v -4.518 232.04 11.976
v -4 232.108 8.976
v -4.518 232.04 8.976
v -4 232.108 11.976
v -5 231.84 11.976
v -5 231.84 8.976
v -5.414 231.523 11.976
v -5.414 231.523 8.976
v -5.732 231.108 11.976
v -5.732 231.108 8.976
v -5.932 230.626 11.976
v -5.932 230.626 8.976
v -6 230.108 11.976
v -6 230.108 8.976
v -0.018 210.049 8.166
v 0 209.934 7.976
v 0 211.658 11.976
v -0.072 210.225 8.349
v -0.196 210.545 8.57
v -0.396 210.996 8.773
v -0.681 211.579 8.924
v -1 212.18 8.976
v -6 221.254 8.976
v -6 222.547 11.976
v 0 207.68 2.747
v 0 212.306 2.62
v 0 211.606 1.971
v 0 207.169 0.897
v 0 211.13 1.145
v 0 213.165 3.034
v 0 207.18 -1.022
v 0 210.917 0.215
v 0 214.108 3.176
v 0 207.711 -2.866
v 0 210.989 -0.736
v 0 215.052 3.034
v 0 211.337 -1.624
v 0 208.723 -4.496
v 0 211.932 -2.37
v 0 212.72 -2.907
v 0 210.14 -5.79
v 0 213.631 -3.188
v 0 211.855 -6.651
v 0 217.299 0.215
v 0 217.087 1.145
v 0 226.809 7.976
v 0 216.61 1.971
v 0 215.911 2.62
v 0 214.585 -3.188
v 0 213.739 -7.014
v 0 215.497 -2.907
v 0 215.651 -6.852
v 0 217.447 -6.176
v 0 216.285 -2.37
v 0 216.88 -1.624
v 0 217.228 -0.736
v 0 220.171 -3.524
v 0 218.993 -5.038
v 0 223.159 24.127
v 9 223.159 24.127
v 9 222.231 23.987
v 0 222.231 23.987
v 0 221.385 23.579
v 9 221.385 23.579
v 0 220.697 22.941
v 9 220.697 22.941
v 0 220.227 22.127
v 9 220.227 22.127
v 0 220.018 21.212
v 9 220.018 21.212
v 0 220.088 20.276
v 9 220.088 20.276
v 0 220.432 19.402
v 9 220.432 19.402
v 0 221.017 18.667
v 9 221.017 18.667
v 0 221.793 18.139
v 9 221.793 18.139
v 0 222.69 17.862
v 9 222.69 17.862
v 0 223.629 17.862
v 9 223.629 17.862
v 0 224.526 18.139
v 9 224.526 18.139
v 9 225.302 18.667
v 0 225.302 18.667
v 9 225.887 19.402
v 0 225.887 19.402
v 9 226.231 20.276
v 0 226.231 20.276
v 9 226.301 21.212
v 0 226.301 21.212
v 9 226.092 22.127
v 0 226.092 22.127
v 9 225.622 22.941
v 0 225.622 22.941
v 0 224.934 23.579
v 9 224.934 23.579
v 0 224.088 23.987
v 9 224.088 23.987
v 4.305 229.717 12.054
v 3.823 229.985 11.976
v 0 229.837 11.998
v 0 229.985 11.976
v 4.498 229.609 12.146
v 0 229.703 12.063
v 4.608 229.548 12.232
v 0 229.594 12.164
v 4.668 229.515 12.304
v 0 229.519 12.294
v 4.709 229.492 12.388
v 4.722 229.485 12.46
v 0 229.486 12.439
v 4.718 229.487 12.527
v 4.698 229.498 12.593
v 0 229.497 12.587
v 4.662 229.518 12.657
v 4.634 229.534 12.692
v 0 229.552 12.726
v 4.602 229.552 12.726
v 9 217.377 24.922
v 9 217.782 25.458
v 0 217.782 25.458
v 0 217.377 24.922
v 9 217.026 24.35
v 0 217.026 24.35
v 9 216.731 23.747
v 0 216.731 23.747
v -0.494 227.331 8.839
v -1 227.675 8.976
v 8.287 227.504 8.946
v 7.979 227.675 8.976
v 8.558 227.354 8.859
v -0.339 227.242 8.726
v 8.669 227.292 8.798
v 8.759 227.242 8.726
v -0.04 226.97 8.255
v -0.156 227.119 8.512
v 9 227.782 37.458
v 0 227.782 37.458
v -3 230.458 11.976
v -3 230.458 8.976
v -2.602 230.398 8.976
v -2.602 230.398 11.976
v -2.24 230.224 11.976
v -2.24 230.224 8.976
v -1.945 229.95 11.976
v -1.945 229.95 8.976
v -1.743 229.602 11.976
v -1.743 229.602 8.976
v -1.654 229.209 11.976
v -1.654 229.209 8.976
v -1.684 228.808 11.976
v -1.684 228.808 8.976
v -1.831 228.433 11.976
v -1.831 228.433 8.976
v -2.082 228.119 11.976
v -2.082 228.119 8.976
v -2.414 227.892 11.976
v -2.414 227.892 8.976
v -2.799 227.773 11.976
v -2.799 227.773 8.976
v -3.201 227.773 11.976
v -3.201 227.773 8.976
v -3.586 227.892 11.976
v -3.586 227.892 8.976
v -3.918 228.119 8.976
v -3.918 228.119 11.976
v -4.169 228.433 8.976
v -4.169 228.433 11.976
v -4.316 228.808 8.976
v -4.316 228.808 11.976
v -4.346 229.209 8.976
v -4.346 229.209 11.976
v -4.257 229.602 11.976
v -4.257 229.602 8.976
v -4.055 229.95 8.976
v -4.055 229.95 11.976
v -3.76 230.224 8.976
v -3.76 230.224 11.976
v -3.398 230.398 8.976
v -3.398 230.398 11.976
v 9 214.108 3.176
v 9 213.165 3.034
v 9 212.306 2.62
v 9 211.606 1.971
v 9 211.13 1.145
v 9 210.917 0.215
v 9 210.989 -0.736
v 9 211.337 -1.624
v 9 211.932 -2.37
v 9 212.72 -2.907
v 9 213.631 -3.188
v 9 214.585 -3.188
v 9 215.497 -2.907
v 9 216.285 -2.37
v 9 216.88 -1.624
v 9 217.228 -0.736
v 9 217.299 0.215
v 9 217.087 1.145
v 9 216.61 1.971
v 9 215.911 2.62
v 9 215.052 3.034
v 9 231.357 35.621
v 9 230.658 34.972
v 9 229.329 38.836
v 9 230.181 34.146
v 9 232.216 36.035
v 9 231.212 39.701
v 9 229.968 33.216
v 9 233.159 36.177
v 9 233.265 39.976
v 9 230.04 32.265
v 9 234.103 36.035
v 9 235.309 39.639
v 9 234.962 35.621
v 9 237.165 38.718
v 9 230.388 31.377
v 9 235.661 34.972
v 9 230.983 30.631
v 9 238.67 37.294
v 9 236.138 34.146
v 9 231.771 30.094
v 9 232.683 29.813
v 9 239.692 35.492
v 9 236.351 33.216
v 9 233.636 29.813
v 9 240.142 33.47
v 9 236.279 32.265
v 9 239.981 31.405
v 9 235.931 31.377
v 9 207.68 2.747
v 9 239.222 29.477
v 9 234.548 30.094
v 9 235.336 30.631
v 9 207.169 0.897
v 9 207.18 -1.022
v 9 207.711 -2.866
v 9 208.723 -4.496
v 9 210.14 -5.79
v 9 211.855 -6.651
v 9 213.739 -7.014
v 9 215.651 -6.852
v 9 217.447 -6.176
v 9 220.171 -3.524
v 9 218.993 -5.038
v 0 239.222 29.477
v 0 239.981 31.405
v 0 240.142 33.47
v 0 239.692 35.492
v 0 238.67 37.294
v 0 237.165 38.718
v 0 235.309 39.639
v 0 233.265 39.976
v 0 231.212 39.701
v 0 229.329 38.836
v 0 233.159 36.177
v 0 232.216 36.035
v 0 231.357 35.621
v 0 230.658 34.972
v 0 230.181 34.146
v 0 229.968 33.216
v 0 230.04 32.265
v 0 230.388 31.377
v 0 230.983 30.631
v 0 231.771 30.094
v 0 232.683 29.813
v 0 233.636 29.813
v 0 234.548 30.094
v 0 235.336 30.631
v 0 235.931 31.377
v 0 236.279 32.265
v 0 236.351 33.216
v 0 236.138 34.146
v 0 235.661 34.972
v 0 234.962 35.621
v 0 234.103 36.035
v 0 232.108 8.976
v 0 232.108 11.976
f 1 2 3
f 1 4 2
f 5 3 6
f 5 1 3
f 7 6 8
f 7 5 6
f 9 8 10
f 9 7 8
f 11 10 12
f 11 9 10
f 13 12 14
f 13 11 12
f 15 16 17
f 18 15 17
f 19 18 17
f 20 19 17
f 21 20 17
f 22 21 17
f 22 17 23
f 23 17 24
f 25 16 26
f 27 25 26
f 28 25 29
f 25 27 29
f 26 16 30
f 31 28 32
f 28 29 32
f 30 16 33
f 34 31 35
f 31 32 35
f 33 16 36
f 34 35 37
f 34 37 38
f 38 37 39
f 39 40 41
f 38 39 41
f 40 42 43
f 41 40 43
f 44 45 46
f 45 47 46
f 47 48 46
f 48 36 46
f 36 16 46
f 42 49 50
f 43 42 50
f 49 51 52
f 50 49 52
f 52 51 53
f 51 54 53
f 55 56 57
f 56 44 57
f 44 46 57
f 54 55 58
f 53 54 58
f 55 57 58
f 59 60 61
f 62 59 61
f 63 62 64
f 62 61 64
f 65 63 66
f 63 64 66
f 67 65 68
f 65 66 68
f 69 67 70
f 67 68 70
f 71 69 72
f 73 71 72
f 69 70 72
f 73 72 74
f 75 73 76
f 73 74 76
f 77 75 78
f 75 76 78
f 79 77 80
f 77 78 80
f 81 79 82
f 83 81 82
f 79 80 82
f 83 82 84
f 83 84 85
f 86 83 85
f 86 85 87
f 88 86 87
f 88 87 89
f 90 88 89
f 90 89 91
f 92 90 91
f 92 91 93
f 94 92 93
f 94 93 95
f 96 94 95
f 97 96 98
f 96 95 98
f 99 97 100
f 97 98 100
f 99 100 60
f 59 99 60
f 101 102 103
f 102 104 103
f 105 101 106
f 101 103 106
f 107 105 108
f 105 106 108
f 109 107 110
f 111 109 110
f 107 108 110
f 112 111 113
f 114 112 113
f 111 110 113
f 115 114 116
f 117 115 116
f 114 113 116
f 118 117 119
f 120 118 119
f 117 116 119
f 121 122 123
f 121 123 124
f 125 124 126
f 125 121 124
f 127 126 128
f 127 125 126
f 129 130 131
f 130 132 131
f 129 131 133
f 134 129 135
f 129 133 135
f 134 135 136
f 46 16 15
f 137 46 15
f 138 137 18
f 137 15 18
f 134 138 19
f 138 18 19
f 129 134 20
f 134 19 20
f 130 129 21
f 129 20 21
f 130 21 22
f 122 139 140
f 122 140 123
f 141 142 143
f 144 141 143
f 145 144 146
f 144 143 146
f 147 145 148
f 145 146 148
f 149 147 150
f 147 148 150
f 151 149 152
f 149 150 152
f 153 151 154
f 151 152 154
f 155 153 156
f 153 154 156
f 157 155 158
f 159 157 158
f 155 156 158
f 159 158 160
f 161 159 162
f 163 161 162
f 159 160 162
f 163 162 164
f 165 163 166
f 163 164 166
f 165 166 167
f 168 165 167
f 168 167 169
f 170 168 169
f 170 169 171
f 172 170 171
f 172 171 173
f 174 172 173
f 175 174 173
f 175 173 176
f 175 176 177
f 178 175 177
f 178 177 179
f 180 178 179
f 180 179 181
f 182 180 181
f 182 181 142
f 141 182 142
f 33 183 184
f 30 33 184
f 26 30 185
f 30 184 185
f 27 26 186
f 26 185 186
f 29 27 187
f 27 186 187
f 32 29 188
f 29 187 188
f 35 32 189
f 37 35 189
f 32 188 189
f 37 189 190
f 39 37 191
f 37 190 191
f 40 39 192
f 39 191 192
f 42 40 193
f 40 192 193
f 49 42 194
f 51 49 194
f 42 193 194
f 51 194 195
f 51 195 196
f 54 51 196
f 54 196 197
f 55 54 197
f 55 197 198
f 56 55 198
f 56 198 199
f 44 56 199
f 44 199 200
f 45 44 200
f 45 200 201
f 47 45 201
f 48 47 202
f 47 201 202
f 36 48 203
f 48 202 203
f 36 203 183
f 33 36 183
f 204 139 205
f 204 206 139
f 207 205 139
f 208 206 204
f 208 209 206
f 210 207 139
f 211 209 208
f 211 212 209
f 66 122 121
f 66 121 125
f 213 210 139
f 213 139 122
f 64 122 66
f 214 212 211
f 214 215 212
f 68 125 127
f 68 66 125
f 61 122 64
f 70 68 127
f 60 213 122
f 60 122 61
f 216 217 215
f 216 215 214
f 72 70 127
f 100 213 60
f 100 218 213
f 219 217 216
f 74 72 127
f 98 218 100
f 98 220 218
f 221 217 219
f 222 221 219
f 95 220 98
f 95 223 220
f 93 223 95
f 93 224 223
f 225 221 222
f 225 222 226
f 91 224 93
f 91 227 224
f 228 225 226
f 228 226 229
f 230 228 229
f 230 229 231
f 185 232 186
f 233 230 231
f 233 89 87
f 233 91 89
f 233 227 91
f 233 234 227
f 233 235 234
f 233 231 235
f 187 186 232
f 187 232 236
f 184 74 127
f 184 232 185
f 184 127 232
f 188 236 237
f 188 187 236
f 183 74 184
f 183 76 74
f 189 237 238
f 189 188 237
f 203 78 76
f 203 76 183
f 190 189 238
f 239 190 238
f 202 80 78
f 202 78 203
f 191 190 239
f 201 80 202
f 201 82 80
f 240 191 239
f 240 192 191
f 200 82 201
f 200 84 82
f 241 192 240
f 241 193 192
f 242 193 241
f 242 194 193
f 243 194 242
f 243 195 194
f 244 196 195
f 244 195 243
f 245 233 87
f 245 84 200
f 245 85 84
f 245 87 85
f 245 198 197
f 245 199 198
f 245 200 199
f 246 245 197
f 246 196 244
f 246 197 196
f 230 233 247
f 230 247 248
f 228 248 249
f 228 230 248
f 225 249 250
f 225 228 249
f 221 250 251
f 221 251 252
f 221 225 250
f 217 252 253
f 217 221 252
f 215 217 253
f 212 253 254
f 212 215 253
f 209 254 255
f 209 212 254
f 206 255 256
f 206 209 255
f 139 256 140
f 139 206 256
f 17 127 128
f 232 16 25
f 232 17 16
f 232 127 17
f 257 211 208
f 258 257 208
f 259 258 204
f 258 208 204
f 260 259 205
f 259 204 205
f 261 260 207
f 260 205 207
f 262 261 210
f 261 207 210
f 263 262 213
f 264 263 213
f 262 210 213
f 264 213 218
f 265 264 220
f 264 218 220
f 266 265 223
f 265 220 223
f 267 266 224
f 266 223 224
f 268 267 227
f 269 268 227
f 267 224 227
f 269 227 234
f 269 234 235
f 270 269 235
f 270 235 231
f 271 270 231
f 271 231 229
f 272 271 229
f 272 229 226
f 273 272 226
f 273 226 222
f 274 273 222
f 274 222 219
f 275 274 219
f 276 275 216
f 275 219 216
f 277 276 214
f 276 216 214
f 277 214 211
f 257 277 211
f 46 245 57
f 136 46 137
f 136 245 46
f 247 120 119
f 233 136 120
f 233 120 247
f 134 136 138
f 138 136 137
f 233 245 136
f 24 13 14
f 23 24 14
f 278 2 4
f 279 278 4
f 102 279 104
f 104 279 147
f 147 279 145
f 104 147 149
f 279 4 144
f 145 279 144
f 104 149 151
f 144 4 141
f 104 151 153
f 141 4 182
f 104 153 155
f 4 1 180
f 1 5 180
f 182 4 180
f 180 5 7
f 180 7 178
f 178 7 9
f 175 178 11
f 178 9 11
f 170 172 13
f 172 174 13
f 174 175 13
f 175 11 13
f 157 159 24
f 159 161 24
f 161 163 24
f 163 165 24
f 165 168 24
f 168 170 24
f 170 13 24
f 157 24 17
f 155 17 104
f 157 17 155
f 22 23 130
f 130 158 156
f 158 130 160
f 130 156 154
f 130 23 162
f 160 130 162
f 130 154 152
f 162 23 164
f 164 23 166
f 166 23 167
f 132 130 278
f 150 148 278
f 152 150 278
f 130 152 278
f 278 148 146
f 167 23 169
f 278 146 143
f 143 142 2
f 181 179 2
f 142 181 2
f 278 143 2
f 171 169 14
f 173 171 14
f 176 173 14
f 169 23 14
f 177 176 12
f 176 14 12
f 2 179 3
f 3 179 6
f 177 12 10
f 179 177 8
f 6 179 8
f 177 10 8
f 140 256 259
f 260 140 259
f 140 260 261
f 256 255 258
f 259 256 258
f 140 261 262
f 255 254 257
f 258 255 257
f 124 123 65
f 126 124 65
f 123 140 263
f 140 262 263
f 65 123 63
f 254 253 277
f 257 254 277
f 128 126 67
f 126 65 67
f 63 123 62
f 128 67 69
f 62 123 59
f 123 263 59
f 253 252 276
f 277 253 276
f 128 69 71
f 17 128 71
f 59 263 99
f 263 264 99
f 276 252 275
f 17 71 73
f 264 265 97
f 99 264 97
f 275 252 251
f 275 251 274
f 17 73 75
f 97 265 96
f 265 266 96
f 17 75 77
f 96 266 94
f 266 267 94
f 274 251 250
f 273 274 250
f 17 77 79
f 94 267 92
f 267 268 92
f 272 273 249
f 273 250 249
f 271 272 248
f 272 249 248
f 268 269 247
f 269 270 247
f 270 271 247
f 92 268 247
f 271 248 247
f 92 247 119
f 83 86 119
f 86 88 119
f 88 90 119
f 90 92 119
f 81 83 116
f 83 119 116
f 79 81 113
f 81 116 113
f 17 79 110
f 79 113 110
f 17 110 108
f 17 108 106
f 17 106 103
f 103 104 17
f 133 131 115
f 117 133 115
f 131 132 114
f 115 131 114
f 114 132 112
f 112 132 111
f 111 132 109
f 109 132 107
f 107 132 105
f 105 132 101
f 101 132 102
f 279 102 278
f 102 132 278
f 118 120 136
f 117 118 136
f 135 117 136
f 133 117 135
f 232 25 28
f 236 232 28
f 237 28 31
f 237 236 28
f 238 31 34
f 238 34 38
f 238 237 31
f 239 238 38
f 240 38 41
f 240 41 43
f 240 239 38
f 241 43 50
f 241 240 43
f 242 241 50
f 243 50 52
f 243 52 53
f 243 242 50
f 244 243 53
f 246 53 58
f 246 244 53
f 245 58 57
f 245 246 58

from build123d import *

# Parameters (mm, degrees)
SKETCH1_R                       = 3.20000000000001
SKETCH1_R_2                     = 3.2000000000000157
SKETCH1_R_3                     = 3.1500000000000266
BOSS_EXTRUDE1_DEPTH             = 9.000000000000002
BOSS_EXTRUDE2_DEPTH             = 6
BOSS_EXTRUDE2_DIRECTION_2_REACH = 245.63
SKETCH3_R                       = 1.3499999999999934
CUT_EXTRUDE1_DEPTH              = 243.3192700509415
CHAMFER1_SIZE                   = 6
CHAMFER1_SIZE_2                 = 10
CHAMFER2_SIZE                   = 5
CHAMFER2_SIZE_2                 = 9
FILLET1_R                       = 2
FILLET2_R                       = 0.5
FILLET3_R                       = 0.5
FILLET4_R                       = 1


with BuildPart() as part:
    # Sketch1 → Boss-Extrude1 (new body)
    with BuildSketch(Plane(origin=(9.000000000000002, 0, 0), x_dir=(0, 0, -1), z_dir=(1, 0, 0))):
        with BuildLine():
            Line((3.5235214674406836, 220.17063085897752), (-29.477274377996263, 239.2218112310119))
            ThreePointArc((-29.477274377996263, 239.2218112310119), (-38.718007493319135, 237.16461837930046), (-37.45821987569468, 227.78186152983258))
            Line((-37.45821987569468, 227.78186152983258), (-25.4578021395881, 217.78186152983255))
            ThreePointArc((-25.4578021395881, 217.78186152983255), (-24.640376533153265, 217.19486094146168), (-23.74722639538112, 216.731139964795))
            Line((-23.74722639538112, 216.731139964795), (-2.7468482860507106, 207.6799595927607))
            ThreePointArc((-2.7468482860507106, 207.6799595927607), (6.279741658038257, 210.96778498862912), (3.5235214674406836, 220.17063085897752))
        make_face()
        with Locations(Location((0.02377470320349104, 214.10830683380283, 0), (0, 0, 180))):
            Circle(SKETCH1_R, mode=Mode.SUBTRACT)
        with Locations(Location((-32.97702114223346, 233.1594872058372, 0), (0, 0, 180))):
            Circle(SKETCH1_R_2, mode=Mode.SUBTRACT)
        with Locations(Location((-20.97660340612688, 223.1594872058372, 0), (0, 0, 180))):
            Circle(SKETCH1_R_3, mode=Mode.SUBTRACT)
    extrude(amount=-BOSS_EXTRUDE1_DEPTH)

    # Sketch2 → Boss-Extrude2 (add)
    with BuildSketch(Plane.ZY):
        Polygon((8.976225296796509, 232.10830683380286), (11.976225296796507, 232.10830683380286), (11.97622529679651, 211.6578287344907), (8.976225296796512, 210.36482624783363), align=None)
    extrude(amount=BOSS_EXTRUDE2_DEPTH)

    # Boss-Extrude2 direction 2: up to this face of the body (flat: up to its plane)
    boss_extrude2_direction_2_end = Plane(part.part.faces().sort_by_distance((9, 223.146004551, 16.682900482))[0])
    # Sketch2 → Boss-Extrude2 direction 2 (add, up to the picked face)
    with BuildSketch(Plane.ZY, mode=Mode.PRIVATE) as boss_extrude2_direction_2_sk1:
        Polygon((8.976225296796509, 232.10830683380286), (11.976225296796507, 232.10830683380286), (11.97622529679651, 211.6578287344907), (8.976225296796512, 210.36482624783363), align=None)
    boss_extrude2_direction_2_tool1 = split(extrude(boss_extrude2_direction_2_sk1.sketch, amount=-BOSS_EXTRUDE2_DIRECTION_2_REACH, mode=Mode.PRIVATE), bisect_by=boss_extrude2_direction_2_end, keep=Keep.BOTH, mode=Mode.PRIVATE)
    add(boss_extrude2_direction_2_tool1.solids().sort_by(Axis((0, 221.556515, 10.460903), (1, 0, 0)))[0])

    # Sketch3 → Cut-Extrude1 (cut, through all)
    with BuildSketch(Plane(origin=(0, 1.43e-15, 8.976225296796544), x_dir=(-1, 0, 0), z_dir=(0, -1.6e-16, -1))):
        with Locations(Location((3, 229.10830683380286, 0), (0, 0, 90))):
            Circle(SKETCH3_R)
    extrude(amount=-CUT_EXTRUDE1_DEPTH, mode=Mode.SUBTRACT)

    # Chamfer1
    # the kernel refuses this chamfer: 10, 6 mm, written as the material it takes off along each edge
    with BuildSketch(Plane(origin=(-6, 221.89433509463086, 35.72677442359438), x_dir=(0.9984760801092615, -0.05067944312803606, 0.021842881995648558), z_dir=(0, -0.3958032841791771, -0.9183353201488973))) as chamfer1_piece_1:
        Polygon((CHAMFER1_SIZE * 0.998476080109, -CHAMFER1_SIZE * 0.0551862070598), (-CHAMFER1_SIZE_2 * 0.0551862070598, -CHAMFER1_SIZE_2 * 0.998476080109), (0, 0), align=None)
    extrude(amount=54.99200253498646, mode=Mode.SUBTRACT)

    # Chamfer2
    # the kernel refuses this chamfer: 9, 5 mm, written as the material it takes off along each edge
    with BuildSketch(Plane(origin=(9.000000000000002, 232.10830683380286, -14.314617746831651), x_dir=(0.060700782983652134, -0.9981560073180803, 0), z_dir=(0, 0, 1))) as chamfer2_piece_1_section:
        Polygon((CHAMFER2_SIZE * 0.998156007318, -CHAMFER2_SIZE * 0.0607007829837), (-CHAMFER2_SIZE_2 * 0.0607007829837, -CHAMFER2_SIZE_2 * 0.998156007318), (0, 0), align=None)
    chamfer2_piece_1 = extrude(amount=49.581686087256315, mode=Mode.PRIVATE)
    chamfer2_piece_1 = split(chamfer2_piece_1, bisect_by=Plane(origin=(5.860742966777749, 228.82016054729928, 11.45934877100172), z_dir=(0, 0.8660462893106784, -0.49996382346246293)), keep=Keep.TOP, mode=Mode.PRIVATE)
    add(chamfer2_piece_1, mode=Mode.SUBTRACT)

    # Fillet1
    fillet1_edges = [part.edges().sort_by_distance(p)[0] for p in [
        (-6, 232.10830683380286, 10.476225296796507),
    ]]
    fillet(fillet1_edges, radius=FILLET1_R)

    # Fillet2
    fillet2_edges = [part.edges().sort_by_distance(p)[0] for p in [
        (4.249475994772133, 227.38666683961173, 8.97622529679651),
    ]]
    fillet(fillet2_edges, radius=FILLET2_R)

    # Fillet3
    fillet3_edges = [part.edges().sort_by_distance(p)[0] for p in [
        (2.6907806455631165, 229.11855056095553, 11.976225296796507),
    ]]
    fillet(fillet3_edges, radius=FILLET3_R)

    # Fillet4
    fillet4_edges = [part.edges().sort_by_distance(p)[0] for p in [
        (0, 219.020091073198, 8.97622529679651),
    ]]
    fillet(fillet4_edges, radius=FILLET4_R)


solid = part.part
